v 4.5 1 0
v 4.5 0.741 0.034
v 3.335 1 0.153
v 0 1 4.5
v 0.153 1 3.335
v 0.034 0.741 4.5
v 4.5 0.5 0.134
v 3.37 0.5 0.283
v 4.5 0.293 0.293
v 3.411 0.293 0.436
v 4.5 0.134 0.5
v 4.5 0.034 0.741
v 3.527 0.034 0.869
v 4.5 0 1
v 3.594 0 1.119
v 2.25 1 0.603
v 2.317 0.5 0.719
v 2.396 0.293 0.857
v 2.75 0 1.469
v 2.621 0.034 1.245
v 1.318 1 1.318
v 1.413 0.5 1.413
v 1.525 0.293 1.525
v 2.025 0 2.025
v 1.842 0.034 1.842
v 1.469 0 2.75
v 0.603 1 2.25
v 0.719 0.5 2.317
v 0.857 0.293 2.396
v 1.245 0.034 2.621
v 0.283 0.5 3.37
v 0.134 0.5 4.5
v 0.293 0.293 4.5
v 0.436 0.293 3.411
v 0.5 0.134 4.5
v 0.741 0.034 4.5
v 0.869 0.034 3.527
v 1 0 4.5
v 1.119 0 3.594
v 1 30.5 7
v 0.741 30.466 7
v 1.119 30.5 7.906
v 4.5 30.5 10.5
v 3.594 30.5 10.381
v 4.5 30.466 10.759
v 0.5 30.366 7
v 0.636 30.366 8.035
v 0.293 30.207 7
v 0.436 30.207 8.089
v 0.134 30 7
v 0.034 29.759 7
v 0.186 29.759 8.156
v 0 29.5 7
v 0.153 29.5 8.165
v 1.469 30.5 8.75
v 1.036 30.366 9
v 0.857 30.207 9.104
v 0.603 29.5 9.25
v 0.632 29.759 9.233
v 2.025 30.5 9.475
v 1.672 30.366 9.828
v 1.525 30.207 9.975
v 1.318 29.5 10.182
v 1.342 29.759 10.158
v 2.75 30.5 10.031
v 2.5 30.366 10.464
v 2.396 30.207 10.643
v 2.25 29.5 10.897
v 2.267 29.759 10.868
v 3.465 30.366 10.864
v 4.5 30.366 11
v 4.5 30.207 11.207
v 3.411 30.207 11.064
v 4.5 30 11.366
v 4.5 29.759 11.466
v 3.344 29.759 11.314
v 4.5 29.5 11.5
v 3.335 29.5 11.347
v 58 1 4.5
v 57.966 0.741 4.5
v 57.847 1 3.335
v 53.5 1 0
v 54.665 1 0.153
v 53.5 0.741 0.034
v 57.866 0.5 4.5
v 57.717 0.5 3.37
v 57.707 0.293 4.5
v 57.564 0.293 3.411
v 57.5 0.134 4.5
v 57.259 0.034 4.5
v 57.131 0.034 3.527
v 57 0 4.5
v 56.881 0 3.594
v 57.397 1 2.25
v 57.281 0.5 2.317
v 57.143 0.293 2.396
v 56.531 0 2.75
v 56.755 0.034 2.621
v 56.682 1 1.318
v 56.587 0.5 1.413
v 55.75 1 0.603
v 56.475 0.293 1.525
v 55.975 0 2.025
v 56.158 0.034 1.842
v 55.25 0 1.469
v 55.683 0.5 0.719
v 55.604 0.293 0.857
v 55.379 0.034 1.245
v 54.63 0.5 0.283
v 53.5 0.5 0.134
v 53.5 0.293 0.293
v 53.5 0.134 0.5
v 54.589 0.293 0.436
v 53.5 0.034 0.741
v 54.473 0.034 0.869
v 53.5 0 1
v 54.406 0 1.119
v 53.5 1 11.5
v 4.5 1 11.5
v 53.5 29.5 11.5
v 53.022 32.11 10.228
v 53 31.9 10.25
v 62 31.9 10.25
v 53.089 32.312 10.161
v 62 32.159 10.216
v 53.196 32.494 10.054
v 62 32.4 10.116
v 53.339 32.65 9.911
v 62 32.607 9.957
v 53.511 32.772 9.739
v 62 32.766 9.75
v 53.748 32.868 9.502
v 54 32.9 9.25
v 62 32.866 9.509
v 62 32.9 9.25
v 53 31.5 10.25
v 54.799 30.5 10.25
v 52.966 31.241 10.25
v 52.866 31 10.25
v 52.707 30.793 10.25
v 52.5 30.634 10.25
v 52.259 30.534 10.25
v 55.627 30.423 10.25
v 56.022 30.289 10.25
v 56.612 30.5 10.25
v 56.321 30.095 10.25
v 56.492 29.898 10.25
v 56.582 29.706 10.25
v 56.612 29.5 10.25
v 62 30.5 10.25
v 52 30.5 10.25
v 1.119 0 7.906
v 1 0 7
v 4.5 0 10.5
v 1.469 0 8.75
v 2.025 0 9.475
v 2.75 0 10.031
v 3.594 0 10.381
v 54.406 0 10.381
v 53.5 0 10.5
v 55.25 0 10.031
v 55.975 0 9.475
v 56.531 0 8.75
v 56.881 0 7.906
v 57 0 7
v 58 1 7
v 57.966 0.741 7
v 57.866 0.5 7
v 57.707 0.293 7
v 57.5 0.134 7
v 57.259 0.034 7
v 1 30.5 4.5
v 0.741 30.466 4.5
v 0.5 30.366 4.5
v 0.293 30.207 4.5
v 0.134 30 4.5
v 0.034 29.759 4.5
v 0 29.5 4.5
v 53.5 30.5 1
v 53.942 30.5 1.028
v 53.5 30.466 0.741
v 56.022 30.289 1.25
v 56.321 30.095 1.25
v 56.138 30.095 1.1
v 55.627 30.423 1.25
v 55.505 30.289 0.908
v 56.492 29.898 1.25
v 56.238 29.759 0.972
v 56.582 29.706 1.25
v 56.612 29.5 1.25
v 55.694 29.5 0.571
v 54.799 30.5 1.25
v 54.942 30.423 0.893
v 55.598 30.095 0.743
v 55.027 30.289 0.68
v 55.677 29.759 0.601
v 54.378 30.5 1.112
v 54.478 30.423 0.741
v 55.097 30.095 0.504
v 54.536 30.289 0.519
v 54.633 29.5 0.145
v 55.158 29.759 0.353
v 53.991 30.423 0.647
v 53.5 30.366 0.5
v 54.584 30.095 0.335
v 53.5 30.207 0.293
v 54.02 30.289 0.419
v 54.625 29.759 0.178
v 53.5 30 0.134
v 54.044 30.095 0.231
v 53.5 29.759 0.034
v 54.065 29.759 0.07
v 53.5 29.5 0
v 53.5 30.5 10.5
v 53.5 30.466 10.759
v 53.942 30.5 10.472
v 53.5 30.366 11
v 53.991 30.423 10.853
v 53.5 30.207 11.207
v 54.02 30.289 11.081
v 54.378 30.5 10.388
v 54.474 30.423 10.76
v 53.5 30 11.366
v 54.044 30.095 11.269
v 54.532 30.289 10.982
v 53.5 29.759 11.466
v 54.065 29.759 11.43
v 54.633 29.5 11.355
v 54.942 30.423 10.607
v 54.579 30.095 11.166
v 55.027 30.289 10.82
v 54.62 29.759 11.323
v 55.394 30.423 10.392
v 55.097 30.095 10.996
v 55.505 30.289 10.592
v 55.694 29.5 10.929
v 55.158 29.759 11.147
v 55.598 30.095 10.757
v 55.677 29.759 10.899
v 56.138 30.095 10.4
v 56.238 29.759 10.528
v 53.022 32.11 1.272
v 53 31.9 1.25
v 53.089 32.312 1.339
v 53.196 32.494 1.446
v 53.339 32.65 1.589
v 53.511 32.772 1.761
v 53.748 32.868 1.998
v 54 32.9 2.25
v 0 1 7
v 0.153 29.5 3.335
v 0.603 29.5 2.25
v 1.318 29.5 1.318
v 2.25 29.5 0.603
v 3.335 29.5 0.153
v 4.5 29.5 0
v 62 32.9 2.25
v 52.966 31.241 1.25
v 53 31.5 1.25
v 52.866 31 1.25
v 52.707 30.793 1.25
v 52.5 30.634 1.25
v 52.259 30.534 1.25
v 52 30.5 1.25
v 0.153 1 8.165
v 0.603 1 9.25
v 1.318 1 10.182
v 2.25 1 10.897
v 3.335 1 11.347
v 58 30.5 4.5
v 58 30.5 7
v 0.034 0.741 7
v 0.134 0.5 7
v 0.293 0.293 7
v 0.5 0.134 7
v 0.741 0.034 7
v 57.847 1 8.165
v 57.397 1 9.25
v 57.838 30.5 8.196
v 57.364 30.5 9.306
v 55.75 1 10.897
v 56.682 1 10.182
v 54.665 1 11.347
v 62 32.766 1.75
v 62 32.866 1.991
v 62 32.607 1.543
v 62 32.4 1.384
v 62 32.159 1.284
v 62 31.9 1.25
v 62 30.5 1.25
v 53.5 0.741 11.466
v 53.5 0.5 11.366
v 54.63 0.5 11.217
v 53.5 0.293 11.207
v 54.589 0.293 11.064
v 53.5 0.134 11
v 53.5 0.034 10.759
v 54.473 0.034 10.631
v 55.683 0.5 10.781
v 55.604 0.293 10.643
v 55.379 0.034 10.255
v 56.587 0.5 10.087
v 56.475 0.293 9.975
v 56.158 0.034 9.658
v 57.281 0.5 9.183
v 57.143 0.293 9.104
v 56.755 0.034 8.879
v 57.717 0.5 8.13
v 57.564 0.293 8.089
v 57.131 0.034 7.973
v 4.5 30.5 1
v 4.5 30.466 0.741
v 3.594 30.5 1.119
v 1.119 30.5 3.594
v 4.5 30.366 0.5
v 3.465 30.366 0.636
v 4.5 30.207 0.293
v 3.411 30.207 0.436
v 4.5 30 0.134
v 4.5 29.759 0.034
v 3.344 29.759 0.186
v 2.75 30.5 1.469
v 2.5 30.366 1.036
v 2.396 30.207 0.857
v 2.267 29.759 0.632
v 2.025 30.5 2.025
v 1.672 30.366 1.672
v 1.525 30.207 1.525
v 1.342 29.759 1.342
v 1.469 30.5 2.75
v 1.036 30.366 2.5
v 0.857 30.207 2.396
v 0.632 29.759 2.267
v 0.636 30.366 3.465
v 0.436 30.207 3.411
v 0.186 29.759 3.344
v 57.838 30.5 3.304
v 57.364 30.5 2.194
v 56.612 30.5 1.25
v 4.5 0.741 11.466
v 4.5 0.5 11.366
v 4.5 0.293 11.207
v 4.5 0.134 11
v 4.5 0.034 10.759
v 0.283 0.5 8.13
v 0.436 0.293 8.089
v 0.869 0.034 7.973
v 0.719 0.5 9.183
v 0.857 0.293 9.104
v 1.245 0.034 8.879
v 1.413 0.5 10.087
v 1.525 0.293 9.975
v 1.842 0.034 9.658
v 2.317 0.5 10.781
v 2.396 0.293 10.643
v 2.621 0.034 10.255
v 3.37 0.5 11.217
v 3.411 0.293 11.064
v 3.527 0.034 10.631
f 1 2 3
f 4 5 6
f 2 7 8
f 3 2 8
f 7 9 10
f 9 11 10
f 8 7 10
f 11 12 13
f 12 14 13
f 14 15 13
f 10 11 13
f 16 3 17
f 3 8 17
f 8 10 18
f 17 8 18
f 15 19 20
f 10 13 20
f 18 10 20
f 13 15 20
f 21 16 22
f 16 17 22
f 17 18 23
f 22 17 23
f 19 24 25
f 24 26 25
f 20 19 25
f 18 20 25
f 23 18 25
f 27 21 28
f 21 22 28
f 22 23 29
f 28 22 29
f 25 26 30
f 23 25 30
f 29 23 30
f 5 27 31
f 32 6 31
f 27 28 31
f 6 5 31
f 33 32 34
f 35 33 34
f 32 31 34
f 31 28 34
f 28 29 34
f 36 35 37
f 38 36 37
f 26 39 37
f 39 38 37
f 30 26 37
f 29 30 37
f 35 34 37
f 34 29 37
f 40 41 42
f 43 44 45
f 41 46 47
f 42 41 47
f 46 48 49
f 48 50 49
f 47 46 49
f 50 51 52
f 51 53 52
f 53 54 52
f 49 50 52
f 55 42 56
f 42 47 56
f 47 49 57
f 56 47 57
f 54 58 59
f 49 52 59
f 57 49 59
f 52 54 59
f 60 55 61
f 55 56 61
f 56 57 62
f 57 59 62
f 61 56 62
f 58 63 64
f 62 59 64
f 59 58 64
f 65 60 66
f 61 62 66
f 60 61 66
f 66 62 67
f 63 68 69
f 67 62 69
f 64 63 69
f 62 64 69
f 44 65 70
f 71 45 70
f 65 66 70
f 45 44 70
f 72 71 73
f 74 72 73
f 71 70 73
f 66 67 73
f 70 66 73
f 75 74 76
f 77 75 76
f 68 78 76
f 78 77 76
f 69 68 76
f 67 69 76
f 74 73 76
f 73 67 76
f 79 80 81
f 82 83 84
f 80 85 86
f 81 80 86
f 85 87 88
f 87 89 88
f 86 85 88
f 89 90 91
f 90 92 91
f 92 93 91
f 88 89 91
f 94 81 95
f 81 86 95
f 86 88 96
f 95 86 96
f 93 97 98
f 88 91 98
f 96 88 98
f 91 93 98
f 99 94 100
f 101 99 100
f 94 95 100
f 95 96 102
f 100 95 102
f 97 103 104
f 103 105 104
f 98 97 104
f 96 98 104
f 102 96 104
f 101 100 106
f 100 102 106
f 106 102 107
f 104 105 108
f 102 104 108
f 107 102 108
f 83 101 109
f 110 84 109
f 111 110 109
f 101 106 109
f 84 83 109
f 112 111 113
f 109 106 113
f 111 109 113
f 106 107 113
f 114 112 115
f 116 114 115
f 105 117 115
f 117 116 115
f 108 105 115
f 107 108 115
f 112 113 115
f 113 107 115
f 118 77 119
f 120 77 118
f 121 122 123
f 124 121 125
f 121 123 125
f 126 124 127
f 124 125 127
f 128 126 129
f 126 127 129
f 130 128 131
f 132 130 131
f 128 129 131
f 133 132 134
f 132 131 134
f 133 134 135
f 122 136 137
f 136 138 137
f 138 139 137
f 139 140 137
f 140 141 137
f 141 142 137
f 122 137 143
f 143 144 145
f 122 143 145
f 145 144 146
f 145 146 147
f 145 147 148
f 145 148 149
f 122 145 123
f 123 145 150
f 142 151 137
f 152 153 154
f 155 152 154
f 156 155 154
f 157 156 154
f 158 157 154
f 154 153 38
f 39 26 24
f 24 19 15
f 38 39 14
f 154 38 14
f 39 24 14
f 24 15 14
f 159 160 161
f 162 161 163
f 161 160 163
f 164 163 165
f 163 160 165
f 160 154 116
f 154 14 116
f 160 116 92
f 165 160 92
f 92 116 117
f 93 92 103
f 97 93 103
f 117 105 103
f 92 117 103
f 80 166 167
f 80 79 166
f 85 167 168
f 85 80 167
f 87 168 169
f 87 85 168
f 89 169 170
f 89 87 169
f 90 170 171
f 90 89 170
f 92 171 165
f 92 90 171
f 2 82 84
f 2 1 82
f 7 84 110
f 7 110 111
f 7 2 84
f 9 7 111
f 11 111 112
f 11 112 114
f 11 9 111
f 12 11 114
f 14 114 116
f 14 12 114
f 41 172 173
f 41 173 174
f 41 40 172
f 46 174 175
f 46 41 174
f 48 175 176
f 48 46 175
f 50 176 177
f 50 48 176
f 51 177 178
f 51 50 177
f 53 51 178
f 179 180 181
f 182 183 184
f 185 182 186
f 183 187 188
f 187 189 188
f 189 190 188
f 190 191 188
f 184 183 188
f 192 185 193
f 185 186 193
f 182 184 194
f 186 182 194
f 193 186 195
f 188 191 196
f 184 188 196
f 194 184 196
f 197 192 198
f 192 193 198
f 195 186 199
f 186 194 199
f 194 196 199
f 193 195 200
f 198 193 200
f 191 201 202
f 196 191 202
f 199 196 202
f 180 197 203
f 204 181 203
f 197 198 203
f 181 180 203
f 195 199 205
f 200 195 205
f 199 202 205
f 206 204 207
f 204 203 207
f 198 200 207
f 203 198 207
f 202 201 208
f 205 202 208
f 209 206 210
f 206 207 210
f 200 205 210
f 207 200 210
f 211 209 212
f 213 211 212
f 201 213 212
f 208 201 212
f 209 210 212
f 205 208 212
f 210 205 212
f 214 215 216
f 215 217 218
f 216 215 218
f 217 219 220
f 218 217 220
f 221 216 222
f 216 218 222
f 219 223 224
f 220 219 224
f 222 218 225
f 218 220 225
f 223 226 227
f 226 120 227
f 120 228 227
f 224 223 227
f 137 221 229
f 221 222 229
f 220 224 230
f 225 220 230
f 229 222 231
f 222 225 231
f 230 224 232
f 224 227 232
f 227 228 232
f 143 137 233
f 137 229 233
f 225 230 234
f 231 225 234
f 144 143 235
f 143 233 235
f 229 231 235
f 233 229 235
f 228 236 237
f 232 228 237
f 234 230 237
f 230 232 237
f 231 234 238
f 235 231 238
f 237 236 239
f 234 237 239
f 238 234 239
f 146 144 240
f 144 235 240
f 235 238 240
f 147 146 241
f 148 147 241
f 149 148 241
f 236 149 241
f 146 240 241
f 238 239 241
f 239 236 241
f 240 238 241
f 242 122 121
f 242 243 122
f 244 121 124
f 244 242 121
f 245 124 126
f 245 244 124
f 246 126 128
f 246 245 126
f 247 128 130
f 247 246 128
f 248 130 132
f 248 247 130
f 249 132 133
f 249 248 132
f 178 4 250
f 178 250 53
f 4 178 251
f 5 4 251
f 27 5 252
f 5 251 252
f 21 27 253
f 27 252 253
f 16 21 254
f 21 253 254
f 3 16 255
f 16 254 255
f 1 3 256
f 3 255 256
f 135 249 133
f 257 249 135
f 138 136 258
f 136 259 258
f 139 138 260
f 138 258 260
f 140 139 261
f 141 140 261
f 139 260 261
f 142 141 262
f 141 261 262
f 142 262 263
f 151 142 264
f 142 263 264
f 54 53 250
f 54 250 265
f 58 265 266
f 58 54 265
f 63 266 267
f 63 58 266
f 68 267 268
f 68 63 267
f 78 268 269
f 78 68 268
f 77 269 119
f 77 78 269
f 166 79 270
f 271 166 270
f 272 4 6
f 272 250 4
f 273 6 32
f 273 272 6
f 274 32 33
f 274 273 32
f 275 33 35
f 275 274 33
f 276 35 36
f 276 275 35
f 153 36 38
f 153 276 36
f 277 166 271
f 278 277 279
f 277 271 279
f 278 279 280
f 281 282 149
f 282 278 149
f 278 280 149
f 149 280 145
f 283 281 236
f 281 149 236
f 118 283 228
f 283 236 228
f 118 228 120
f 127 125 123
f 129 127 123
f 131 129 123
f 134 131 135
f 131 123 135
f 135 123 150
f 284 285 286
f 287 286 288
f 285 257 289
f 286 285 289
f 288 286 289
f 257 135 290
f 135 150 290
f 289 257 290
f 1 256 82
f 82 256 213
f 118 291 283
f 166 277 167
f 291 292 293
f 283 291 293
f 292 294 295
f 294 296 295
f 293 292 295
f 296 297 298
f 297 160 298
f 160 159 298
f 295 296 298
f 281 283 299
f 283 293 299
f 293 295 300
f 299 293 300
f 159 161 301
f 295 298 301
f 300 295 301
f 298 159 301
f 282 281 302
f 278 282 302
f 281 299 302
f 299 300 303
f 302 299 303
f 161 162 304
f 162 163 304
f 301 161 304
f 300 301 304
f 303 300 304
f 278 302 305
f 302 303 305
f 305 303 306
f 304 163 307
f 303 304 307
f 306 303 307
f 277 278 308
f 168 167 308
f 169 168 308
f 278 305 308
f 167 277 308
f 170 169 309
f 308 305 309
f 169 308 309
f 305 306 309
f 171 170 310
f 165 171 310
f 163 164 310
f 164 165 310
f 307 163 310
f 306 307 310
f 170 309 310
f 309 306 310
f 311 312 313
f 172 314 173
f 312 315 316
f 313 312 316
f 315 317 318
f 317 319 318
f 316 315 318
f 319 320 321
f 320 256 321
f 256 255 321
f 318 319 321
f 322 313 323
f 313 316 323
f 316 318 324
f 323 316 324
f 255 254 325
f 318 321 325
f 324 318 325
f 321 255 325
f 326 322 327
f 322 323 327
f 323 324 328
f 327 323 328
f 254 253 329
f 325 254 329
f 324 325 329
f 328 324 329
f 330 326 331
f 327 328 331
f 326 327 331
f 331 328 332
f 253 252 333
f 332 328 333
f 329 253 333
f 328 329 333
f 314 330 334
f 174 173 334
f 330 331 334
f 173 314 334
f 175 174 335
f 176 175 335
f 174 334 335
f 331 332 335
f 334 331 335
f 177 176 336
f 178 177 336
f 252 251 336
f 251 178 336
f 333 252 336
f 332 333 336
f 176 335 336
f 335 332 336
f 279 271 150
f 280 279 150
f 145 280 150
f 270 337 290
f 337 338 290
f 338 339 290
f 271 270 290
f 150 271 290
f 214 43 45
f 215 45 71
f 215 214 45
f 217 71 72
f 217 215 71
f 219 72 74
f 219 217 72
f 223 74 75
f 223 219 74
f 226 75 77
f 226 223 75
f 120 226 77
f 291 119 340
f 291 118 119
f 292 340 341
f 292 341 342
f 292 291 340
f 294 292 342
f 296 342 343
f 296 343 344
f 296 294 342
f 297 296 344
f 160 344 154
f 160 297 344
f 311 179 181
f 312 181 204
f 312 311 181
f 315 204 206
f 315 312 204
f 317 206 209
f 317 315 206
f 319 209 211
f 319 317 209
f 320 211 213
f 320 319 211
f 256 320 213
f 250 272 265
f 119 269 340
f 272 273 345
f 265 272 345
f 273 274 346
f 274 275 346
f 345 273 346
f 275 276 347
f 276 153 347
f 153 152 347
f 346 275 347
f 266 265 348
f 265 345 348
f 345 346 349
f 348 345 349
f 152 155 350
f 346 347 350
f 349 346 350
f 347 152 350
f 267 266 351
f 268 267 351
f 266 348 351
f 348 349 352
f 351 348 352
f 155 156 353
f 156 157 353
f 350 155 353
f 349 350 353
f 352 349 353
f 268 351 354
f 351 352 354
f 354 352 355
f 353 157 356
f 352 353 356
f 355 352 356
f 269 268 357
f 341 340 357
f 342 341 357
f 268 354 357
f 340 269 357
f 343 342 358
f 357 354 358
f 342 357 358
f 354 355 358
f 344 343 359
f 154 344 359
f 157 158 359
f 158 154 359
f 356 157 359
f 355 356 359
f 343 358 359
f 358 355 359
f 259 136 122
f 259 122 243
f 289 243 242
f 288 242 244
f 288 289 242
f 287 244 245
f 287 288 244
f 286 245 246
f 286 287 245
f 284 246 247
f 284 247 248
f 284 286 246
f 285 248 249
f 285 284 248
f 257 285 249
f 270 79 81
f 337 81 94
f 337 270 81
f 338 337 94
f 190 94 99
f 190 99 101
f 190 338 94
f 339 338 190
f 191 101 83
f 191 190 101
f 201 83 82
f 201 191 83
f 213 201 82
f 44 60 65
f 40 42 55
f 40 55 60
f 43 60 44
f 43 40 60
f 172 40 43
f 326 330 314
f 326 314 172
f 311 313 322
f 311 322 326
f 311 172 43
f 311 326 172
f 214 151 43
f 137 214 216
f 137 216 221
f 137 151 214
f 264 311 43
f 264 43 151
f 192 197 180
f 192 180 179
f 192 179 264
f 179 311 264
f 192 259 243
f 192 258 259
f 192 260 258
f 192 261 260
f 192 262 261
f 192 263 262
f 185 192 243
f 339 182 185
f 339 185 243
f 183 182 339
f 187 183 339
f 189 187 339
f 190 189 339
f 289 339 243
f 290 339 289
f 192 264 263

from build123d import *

# Parameters (mm, degrees)
SKETCH1_W           = 58
SKETCH1_H           = 30.5
BOSS_EXTRUDE1_DEPTH = 11.5
FILLET1_R           = 4.5
SKETCH2_W           = 9
SKETCH2_H           = 9
BOSS_EXTRUDE2_DEPTH = 2.4
FILLET2_R           = 1


with BuildPart() as part:
    # Sketch1 → Boss-Extrude1 (new body)
    with BuildSketch(Plane.XY):
        with Locations((29, 15.25)):
            Rectangle(SKETCH1_W, SKETCH1_H)
    extrude(amount=BOSS_EXTRUDE1_DEPTH)

    # Fillet1
    fillet1_edges = [part.edges().sort_by_distance(p)[0] for p in [
        (58, 15.25, 11.5),
        (0, 15.25, 11.5),
        (58, 15.25, 0),
        (0, 15.25, 0),
    ]]
    fillet(fillet1_edges, radius=FILLET1_R)

    # Sketch2 → Boss-Extrude2 (add)
    with BuildSketch(Plane(origin=(0, 30.5, 0), x_dir=(1, 0, 0), z_dir=(0, 1, 0))):
        with Locations((57.5, -5.75)):
            Rectangle(SKETCH2_W, SKETCH2_H)
    extrude(amount=BOSS_EXTRUDE2_DEPTH)

    # Fillet2
    fillet2_edges = [part.edges().sort_by_distance(p)[0] for p in [
        (0, 0, 5.75),
        (0, 30.5, 5.75),
        (29, 0, 0),
        (58, 0, 5.75),
        (29, 0, 11.5),
        (56.681980515, 0, 10.181980515),
        (56.681980515, 0, 1.318019485),
        (1.318019485, 0, 10.181980515),
        (1.318019485, 0, 1.318019485),
        (29, 30.5, 0),
        (29, 30.5, 11.5),
        (55.177050983, 30.5, 11.175823272),
        (1.318019485, 30.5, 10.181980515),
        (1.318019485, 30.5, 1.318019485),
        (55.177050983, 30.5, 0.324176728),
        (53, 30.5, 5.75),
        (53, 32.9, 5.75),
        (57.5, 32.9, 10.25),
        (57.5, 32.9, 1.25),
    ]]
    fillet(fillet2_edges, radius=FILLET2_R)


solid = part.part
